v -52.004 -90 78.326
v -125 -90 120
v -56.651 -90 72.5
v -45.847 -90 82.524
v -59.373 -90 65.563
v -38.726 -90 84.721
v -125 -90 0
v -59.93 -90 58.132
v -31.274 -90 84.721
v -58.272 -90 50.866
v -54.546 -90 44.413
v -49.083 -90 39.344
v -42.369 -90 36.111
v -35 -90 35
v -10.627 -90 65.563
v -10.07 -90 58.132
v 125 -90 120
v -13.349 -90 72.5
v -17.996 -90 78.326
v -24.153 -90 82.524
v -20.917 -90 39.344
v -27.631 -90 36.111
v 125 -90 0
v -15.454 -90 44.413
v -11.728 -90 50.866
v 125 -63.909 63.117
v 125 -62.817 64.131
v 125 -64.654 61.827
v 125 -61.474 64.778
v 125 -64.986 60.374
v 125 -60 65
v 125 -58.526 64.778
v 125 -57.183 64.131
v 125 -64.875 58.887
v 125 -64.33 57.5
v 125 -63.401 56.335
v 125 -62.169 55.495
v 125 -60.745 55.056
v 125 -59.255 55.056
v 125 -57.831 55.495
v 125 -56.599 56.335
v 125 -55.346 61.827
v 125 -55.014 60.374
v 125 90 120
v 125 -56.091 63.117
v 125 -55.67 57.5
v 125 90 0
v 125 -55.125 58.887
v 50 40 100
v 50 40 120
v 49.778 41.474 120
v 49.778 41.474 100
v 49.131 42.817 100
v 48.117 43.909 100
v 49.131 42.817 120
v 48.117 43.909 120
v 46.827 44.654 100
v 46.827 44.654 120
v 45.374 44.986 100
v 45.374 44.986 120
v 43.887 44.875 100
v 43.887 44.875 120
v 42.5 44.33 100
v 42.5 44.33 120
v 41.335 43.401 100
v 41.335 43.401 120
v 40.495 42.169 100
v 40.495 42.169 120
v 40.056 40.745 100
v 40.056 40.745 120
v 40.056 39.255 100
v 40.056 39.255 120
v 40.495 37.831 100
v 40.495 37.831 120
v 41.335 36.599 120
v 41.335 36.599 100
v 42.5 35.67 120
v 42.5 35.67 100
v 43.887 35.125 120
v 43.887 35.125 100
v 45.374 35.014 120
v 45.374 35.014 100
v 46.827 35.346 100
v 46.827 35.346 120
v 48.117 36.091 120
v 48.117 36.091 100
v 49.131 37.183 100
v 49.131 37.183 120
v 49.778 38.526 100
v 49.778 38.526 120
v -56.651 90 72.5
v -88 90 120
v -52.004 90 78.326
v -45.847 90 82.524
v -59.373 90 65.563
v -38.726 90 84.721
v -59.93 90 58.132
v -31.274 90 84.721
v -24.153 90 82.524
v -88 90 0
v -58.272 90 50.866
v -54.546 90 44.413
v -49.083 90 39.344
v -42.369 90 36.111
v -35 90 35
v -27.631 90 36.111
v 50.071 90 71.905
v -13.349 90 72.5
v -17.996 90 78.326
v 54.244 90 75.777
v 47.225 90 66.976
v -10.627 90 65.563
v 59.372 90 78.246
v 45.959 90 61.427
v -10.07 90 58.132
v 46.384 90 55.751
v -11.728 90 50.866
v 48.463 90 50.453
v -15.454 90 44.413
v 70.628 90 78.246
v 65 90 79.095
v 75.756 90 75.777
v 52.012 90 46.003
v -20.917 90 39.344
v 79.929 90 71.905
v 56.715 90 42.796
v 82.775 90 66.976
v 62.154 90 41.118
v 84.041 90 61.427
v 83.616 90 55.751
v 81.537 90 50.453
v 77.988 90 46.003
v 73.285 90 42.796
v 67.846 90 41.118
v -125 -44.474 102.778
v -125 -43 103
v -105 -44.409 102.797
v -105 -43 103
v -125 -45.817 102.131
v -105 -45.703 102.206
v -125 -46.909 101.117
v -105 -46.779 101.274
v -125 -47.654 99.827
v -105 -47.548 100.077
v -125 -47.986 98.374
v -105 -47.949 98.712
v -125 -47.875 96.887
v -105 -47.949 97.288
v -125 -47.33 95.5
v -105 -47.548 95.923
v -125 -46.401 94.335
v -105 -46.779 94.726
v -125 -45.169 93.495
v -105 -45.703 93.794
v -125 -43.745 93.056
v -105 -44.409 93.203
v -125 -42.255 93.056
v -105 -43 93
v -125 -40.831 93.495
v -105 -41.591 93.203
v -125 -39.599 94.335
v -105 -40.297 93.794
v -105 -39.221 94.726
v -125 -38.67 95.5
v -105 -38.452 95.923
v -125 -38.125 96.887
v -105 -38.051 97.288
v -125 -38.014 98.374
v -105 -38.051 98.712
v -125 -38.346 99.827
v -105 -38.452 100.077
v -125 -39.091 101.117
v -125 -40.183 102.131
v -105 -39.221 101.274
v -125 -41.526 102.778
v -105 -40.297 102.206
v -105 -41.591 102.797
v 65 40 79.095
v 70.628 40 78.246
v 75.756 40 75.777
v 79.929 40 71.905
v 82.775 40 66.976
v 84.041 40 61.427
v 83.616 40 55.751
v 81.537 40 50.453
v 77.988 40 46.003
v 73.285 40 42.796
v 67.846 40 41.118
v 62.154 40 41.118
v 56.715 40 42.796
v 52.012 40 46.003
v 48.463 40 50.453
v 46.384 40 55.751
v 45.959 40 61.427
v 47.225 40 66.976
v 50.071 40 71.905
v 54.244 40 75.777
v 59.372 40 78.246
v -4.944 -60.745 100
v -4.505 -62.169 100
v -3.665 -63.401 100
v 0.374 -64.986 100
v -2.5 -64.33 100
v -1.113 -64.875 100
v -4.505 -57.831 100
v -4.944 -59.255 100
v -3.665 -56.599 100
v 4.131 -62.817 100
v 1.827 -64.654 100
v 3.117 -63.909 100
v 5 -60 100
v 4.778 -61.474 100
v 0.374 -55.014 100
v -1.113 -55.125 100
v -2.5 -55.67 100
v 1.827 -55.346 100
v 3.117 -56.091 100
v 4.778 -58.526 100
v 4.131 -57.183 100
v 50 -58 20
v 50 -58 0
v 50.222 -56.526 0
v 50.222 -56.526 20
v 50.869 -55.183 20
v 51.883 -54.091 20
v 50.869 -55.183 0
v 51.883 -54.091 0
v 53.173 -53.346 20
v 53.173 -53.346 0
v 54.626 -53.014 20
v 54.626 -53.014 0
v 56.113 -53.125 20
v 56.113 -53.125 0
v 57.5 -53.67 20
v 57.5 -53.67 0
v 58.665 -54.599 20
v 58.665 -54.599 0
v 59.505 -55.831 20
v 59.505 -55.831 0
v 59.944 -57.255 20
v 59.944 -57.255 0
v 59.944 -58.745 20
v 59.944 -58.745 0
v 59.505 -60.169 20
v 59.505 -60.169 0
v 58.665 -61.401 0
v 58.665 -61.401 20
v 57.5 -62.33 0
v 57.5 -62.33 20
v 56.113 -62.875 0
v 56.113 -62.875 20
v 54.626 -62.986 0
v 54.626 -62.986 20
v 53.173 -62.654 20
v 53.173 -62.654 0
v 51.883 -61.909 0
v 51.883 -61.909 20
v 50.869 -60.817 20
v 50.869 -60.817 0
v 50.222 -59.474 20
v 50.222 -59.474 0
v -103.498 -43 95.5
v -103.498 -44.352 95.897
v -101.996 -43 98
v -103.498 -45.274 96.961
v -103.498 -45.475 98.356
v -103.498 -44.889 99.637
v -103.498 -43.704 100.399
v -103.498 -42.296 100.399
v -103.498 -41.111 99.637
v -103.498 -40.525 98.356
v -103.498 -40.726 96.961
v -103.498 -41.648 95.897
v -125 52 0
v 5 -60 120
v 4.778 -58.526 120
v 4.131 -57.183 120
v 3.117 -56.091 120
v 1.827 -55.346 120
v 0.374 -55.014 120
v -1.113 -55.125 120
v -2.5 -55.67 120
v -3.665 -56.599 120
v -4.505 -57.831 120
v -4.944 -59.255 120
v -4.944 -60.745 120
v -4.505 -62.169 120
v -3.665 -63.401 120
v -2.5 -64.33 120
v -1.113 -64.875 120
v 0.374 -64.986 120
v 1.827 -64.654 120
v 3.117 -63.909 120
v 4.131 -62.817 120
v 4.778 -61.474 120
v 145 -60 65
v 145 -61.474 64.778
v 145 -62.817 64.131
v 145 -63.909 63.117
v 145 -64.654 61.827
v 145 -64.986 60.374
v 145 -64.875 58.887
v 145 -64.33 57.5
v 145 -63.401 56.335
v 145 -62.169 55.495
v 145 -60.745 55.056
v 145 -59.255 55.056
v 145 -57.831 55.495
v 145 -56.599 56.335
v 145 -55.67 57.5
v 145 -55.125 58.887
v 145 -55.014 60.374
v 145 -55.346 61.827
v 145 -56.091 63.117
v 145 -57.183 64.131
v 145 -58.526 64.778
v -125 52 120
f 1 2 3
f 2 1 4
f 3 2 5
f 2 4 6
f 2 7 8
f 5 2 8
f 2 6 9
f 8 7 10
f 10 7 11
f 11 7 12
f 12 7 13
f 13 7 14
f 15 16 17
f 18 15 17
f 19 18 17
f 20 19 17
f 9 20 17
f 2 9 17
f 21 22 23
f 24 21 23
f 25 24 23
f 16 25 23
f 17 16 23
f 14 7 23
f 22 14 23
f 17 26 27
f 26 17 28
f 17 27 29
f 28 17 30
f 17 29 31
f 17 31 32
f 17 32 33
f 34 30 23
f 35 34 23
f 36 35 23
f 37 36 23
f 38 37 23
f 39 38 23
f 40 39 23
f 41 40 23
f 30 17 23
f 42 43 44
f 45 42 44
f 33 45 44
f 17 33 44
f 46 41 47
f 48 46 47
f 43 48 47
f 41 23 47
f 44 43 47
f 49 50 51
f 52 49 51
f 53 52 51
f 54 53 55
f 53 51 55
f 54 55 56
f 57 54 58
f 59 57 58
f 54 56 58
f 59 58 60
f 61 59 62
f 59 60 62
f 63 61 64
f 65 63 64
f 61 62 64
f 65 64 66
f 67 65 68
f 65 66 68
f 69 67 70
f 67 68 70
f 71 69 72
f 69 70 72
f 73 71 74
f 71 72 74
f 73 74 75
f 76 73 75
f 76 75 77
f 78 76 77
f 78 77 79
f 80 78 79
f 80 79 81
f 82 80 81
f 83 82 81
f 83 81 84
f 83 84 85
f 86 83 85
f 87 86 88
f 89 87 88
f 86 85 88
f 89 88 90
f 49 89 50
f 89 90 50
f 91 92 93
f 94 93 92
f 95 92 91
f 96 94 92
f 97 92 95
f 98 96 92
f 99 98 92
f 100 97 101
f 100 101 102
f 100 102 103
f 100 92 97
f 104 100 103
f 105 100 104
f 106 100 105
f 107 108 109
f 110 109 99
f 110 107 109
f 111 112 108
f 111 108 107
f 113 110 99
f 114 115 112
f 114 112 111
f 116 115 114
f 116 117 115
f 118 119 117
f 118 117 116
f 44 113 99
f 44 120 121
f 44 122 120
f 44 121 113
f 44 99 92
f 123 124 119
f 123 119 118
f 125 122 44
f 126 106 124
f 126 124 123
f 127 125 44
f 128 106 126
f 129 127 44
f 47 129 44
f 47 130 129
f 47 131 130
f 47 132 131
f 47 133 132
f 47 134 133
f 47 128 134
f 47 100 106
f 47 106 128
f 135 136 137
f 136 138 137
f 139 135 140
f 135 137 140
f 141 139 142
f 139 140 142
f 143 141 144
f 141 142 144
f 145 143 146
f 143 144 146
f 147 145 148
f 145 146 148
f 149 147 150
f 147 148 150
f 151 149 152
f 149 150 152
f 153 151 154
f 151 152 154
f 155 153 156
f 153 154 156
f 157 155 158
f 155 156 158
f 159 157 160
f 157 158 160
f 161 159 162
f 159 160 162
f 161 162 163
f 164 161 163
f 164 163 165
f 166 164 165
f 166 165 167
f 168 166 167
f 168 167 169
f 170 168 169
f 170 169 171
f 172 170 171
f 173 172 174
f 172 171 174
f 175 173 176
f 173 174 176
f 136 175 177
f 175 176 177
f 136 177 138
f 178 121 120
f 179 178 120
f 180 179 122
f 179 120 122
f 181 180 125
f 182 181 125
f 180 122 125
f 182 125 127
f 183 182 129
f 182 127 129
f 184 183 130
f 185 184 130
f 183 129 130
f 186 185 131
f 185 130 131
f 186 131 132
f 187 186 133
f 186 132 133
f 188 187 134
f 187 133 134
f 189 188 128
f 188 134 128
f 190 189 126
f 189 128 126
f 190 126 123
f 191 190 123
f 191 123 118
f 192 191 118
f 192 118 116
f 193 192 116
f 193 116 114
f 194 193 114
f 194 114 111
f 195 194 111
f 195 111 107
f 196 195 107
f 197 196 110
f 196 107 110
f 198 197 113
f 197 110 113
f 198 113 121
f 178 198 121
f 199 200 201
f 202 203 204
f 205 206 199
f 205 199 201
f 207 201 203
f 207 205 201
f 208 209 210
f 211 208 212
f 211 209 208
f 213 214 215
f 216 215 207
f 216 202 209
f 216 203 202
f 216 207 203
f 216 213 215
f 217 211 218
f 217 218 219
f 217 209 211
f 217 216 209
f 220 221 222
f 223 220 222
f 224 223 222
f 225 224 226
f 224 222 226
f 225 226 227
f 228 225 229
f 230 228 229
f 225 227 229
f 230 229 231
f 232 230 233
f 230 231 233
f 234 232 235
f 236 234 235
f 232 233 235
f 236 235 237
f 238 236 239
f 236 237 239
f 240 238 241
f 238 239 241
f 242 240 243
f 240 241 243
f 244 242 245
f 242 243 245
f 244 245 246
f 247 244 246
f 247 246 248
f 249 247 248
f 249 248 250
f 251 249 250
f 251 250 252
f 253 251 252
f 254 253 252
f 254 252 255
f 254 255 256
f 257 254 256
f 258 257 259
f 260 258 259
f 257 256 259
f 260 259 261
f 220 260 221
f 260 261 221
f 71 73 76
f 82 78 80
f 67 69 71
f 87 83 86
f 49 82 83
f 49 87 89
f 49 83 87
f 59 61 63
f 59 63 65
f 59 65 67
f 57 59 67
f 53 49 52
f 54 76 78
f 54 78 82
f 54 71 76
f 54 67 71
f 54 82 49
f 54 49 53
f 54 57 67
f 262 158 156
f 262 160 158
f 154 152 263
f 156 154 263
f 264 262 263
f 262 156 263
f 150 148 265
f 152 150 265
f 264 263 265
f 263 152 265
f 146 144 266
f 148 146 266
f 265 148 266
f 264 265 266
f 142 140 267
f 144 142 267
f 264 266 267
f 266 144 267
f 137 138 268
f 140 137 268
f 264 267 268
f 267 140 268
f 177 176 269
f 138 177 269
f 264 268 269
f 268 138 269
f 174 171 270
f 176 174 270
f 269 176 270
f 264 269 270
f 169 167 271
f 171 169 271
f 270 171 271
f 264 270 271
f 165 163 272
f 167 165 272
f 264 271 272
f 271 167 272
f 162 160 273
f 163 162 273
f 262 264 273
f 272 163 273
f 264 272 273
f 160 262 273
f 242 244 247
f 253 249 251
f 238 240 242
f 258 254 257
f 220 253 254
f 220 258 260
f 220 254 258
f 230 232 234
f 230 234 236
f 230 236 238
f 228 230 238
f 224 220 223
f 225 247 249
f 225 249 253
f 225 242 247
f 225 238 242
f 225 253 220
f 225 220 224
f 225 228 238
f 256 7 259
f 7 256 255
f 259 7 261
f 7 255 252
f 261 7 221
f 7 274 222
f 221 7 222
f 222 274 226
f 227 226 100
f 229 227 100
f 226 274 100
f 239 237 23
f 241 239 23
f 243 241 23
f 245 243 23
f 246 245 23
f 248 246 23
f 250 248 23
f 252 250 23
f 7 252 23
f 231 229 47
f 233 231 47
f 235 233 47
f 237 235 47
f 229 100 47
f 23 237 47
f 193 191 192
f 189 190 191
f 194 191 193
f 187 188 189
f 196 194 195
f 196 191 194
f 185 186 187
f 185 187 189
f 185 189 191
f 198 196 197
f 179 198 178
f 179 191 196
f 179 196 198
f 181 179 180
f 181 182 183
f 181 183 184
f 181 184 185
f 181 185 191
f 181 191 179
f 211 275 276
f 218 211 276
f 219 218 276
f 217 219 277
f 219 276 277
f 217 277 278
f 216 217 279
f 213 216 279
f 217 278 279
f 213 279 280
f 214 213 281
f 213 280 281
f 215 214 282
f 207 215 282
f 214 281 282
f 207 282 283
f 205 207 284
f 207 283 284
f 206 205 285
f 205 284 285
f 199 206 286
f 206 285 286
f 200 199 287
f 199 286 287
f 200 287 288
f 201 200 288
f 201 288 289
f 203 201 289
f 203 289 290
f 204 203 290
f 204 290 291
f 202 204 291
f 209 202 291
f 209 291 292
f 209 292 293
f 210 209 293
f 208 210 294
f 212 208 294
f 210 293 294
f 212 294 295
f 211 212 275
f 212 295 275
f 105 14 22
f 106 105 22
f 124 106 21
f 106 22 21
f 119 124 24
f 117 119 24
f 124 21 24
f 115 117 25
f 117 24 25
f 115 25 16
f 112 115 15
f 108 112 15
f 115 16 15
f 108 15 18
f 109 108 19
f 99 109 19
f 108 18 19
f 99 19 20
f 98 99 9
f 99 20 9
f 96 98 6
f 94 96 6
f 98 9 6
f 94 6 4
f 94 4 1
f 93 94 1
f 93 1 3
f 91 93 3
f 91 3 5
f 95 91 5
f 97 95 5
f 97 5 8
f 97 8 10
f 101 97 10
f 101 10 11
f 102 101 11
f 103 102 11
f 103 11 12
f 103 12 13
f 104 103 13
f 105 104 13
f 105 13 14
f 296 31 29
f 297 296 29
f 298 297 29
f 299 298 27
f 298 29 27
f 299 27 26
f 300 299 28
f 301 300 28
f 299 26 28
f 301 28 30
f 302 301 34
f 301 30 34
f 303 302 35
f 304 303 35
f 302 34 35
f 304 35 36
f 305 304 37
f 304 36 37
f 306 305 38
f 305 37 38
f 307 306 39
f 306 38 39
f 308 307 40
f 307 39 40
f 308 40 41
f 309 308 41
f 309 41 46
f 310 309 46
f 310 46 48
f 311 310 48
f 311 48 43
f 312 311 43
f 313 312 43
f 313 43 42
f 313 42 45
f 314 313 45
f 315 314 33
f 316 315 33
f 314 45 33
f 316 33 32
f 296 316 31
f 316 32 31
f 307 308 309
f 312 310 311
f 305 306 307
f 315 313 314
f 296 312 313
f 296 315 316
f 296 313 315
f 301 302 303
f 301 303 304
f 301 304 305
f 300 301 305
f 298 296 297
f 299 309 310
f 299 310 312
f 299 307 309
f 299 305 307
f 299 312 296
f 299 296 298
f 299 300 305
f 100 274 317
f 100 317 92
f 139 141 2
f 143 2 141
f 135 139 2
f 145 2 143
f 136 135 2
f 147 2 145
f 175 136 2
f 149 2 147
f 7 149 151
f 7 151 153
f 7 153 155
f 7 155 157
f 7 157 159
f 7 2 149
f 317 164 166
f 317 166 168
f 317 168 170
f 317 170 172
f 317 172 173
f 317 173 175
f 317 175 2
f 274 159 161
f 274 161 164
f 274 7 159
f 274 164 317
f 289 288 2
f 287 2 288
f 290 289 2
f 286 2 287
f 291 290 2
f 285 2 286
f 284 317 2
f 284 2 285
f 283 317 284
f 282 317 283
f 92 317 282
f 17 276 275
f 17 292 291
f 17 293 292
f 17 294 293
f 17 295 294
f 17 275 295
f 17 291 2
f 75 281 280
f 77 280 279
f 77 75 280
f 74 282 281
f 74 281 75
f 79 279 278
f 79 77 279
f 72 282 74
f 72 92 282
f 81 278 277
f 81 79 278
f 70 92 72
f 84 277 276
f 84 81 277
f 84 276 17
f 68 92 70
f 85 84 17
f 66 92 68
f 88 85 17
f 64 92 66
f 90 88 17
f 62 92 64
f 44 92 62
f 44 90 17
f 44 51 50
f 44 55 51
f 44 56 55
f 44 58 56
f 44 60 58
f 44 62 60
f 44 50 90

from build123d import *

# Parameters (mm, degrees)
SKETCH1_W                  = 250
SKETCH1_H                  = 180
BOSS_EXTRUDE1_DEPTH        = 120
CUT_EXTRUDE2_DEPTH         = 196.256241898
CUT_EXTRUDE2_DEPTH_BACK    = 120
SKETCH3_R                  = 5
CUT_EXTRUDE3_DEPTH         = 20
SKETCH4_R                  = 5
CUT_EXTRUDE4_DEPTH         = 20
SKETCH6_R                  = 5
CUT_EXTRUDE6_DEPTH         = 20
SKETCH7_R                  = 25
CUT_EXTRUDE7_DEPTH         = 250.849954973
SKETCH5_R                  = 5
BOSS_EXTRUDE2_DEPTH        = 20
F_10_0MM_DOWEL_HOLE1_D     = 10
F_10_0MM_DOWEL_HOLE1_DEPTH = 20
F_10_0MM_DOWEL_HOLE1_TIP   = 3.004303095
SKETCH9_R                  = 19.094825028
CUT_EXTRUDE8_DEPTH         = 50


with BuildPart() as part:
    # Sketch1 → Boss-Extrude1 (new body)
    with BuildSketch(Plane.XY):
        Rectangle(SKETCH1_W, SKETCH1_H)
    extrude(amount=BOSS_EXTRUDE1_DEPTH)

    # Sketch2 → Cut-Extrude2 (cut, two sides: drawn at the far end of the back side and taken through both)
    with BuildSketch(Plane.XY.offset(120).offset(-CUT_EXTRUDE2_DEPTH_BACK)):
        Polygon((320.124564524, 509.15495816), (-88, 90), (-125, 52), (-533.124564524, -367.15495816), (-1371.434480844, 449.094170888), (-518.185351796, 1325.404087208), align=None)
    extrude(amount=CUT_EXTRUDE2_DEPTH + CUT_EXTRUDE2_DEPTH_BACK, mode=Mode.SUBTRACT)

    # Sketch3 → Cut-Extrude3 (cut)
    with BuildSketch(Plane.XY.offset(120)):
        with Locations((45, 40)):
            Circle(SKETCH3_R)
    extrude(amount=-CUT_EXTRUDE3_DEPTH, mode=Mode.SUBTRACT)

    # Sketch4 → Cut-Extrude4 (cut)
    with BuildSketch(Plane.XY.offset(120)):
        with Locations((0, -60)):
            Circle(SKETCH4_R)
    extrude(amount=-CUT_EXTRUDE4_DEPTH, mode=Mode.SUBTRACT)

    # Sketch6 → Cut-Extrude6 (cut)
    with BuildSketch(Plane(origin=(0, 0, 0), x_dir=(-1, 0, 0), z_dir=(0, 0, -1))):
        with Locations((-55, -58)):
            Circle(SKETCH6_R)
    extrude(amount=-CUT_EXTRUDE6_DEPTH, mode=Mode.SUBTRACT)

    # Sketch7 → Cut-Extrude7 (cut, through all)
    with BuildSketch(Plane.XZ.offset(90)):
        with Locations(Location((-35, 60, 0), (0, 0, 270))):
            Circle(SKETCH7_R)
    extrude(amount=-CUT_EXTRUDE7_DEPTH, mode=Mode.SUBTRACT)

    # Sketch5 → Boss-Extrude2 (add)
    with BuildSketch(Plane(origin=(125, 0, 0), x_dir=(0, 0, -1), z_dir=(1, 0, 0))):
        with Locations(Location((-60, -60, 0), (0, 0, 180))):
            Circle(SKETCH5_R)
    extrude(amount=BOSS_EXTRUDE2_DEPTH)

    # Ø10.0mm Dowel Hole1
    with Locations(Plane(origin=(-125, -43, 98), x_dir=(0, 0, -1), z_dir=(-1, 0, 0))):
        with Locations((0, 0)):
            Hole(F_10_0MM_DOWEL_HOLE1_D / 2, depth=F_10_0MM_DOWEL_HOLE1_DEPTH)
            with Locations((0, 0, -(F_10_0MM_DOWEL_HOLE1_DEPTH + F_10_0MM_DOWEL_HOLE1_TIP / 2))):  # 118° drill point
                Cone(0, F_10_0MM_DOWEL_HOLE1_D / 2, F_10_0MM_DOWEL_HOLE1_TIP, mode=Mode.SUBTRACT)

    # Sketch9 → Cut-Extrude8 (cut)
    with BuildSketch(Plane(origin=(0, 90, 0), x_dir=(1, 0, 0), z_dir=(0, 1, 0))):
        with Locations(Location((65, -60, 0), (0, 0, 270))):
            Circle(SKETCH9_R)
    extrude(amount=-CUT_EXTRUDE8_DEPTH, mode=Mode.SUBTRACT)


solid = part.part
